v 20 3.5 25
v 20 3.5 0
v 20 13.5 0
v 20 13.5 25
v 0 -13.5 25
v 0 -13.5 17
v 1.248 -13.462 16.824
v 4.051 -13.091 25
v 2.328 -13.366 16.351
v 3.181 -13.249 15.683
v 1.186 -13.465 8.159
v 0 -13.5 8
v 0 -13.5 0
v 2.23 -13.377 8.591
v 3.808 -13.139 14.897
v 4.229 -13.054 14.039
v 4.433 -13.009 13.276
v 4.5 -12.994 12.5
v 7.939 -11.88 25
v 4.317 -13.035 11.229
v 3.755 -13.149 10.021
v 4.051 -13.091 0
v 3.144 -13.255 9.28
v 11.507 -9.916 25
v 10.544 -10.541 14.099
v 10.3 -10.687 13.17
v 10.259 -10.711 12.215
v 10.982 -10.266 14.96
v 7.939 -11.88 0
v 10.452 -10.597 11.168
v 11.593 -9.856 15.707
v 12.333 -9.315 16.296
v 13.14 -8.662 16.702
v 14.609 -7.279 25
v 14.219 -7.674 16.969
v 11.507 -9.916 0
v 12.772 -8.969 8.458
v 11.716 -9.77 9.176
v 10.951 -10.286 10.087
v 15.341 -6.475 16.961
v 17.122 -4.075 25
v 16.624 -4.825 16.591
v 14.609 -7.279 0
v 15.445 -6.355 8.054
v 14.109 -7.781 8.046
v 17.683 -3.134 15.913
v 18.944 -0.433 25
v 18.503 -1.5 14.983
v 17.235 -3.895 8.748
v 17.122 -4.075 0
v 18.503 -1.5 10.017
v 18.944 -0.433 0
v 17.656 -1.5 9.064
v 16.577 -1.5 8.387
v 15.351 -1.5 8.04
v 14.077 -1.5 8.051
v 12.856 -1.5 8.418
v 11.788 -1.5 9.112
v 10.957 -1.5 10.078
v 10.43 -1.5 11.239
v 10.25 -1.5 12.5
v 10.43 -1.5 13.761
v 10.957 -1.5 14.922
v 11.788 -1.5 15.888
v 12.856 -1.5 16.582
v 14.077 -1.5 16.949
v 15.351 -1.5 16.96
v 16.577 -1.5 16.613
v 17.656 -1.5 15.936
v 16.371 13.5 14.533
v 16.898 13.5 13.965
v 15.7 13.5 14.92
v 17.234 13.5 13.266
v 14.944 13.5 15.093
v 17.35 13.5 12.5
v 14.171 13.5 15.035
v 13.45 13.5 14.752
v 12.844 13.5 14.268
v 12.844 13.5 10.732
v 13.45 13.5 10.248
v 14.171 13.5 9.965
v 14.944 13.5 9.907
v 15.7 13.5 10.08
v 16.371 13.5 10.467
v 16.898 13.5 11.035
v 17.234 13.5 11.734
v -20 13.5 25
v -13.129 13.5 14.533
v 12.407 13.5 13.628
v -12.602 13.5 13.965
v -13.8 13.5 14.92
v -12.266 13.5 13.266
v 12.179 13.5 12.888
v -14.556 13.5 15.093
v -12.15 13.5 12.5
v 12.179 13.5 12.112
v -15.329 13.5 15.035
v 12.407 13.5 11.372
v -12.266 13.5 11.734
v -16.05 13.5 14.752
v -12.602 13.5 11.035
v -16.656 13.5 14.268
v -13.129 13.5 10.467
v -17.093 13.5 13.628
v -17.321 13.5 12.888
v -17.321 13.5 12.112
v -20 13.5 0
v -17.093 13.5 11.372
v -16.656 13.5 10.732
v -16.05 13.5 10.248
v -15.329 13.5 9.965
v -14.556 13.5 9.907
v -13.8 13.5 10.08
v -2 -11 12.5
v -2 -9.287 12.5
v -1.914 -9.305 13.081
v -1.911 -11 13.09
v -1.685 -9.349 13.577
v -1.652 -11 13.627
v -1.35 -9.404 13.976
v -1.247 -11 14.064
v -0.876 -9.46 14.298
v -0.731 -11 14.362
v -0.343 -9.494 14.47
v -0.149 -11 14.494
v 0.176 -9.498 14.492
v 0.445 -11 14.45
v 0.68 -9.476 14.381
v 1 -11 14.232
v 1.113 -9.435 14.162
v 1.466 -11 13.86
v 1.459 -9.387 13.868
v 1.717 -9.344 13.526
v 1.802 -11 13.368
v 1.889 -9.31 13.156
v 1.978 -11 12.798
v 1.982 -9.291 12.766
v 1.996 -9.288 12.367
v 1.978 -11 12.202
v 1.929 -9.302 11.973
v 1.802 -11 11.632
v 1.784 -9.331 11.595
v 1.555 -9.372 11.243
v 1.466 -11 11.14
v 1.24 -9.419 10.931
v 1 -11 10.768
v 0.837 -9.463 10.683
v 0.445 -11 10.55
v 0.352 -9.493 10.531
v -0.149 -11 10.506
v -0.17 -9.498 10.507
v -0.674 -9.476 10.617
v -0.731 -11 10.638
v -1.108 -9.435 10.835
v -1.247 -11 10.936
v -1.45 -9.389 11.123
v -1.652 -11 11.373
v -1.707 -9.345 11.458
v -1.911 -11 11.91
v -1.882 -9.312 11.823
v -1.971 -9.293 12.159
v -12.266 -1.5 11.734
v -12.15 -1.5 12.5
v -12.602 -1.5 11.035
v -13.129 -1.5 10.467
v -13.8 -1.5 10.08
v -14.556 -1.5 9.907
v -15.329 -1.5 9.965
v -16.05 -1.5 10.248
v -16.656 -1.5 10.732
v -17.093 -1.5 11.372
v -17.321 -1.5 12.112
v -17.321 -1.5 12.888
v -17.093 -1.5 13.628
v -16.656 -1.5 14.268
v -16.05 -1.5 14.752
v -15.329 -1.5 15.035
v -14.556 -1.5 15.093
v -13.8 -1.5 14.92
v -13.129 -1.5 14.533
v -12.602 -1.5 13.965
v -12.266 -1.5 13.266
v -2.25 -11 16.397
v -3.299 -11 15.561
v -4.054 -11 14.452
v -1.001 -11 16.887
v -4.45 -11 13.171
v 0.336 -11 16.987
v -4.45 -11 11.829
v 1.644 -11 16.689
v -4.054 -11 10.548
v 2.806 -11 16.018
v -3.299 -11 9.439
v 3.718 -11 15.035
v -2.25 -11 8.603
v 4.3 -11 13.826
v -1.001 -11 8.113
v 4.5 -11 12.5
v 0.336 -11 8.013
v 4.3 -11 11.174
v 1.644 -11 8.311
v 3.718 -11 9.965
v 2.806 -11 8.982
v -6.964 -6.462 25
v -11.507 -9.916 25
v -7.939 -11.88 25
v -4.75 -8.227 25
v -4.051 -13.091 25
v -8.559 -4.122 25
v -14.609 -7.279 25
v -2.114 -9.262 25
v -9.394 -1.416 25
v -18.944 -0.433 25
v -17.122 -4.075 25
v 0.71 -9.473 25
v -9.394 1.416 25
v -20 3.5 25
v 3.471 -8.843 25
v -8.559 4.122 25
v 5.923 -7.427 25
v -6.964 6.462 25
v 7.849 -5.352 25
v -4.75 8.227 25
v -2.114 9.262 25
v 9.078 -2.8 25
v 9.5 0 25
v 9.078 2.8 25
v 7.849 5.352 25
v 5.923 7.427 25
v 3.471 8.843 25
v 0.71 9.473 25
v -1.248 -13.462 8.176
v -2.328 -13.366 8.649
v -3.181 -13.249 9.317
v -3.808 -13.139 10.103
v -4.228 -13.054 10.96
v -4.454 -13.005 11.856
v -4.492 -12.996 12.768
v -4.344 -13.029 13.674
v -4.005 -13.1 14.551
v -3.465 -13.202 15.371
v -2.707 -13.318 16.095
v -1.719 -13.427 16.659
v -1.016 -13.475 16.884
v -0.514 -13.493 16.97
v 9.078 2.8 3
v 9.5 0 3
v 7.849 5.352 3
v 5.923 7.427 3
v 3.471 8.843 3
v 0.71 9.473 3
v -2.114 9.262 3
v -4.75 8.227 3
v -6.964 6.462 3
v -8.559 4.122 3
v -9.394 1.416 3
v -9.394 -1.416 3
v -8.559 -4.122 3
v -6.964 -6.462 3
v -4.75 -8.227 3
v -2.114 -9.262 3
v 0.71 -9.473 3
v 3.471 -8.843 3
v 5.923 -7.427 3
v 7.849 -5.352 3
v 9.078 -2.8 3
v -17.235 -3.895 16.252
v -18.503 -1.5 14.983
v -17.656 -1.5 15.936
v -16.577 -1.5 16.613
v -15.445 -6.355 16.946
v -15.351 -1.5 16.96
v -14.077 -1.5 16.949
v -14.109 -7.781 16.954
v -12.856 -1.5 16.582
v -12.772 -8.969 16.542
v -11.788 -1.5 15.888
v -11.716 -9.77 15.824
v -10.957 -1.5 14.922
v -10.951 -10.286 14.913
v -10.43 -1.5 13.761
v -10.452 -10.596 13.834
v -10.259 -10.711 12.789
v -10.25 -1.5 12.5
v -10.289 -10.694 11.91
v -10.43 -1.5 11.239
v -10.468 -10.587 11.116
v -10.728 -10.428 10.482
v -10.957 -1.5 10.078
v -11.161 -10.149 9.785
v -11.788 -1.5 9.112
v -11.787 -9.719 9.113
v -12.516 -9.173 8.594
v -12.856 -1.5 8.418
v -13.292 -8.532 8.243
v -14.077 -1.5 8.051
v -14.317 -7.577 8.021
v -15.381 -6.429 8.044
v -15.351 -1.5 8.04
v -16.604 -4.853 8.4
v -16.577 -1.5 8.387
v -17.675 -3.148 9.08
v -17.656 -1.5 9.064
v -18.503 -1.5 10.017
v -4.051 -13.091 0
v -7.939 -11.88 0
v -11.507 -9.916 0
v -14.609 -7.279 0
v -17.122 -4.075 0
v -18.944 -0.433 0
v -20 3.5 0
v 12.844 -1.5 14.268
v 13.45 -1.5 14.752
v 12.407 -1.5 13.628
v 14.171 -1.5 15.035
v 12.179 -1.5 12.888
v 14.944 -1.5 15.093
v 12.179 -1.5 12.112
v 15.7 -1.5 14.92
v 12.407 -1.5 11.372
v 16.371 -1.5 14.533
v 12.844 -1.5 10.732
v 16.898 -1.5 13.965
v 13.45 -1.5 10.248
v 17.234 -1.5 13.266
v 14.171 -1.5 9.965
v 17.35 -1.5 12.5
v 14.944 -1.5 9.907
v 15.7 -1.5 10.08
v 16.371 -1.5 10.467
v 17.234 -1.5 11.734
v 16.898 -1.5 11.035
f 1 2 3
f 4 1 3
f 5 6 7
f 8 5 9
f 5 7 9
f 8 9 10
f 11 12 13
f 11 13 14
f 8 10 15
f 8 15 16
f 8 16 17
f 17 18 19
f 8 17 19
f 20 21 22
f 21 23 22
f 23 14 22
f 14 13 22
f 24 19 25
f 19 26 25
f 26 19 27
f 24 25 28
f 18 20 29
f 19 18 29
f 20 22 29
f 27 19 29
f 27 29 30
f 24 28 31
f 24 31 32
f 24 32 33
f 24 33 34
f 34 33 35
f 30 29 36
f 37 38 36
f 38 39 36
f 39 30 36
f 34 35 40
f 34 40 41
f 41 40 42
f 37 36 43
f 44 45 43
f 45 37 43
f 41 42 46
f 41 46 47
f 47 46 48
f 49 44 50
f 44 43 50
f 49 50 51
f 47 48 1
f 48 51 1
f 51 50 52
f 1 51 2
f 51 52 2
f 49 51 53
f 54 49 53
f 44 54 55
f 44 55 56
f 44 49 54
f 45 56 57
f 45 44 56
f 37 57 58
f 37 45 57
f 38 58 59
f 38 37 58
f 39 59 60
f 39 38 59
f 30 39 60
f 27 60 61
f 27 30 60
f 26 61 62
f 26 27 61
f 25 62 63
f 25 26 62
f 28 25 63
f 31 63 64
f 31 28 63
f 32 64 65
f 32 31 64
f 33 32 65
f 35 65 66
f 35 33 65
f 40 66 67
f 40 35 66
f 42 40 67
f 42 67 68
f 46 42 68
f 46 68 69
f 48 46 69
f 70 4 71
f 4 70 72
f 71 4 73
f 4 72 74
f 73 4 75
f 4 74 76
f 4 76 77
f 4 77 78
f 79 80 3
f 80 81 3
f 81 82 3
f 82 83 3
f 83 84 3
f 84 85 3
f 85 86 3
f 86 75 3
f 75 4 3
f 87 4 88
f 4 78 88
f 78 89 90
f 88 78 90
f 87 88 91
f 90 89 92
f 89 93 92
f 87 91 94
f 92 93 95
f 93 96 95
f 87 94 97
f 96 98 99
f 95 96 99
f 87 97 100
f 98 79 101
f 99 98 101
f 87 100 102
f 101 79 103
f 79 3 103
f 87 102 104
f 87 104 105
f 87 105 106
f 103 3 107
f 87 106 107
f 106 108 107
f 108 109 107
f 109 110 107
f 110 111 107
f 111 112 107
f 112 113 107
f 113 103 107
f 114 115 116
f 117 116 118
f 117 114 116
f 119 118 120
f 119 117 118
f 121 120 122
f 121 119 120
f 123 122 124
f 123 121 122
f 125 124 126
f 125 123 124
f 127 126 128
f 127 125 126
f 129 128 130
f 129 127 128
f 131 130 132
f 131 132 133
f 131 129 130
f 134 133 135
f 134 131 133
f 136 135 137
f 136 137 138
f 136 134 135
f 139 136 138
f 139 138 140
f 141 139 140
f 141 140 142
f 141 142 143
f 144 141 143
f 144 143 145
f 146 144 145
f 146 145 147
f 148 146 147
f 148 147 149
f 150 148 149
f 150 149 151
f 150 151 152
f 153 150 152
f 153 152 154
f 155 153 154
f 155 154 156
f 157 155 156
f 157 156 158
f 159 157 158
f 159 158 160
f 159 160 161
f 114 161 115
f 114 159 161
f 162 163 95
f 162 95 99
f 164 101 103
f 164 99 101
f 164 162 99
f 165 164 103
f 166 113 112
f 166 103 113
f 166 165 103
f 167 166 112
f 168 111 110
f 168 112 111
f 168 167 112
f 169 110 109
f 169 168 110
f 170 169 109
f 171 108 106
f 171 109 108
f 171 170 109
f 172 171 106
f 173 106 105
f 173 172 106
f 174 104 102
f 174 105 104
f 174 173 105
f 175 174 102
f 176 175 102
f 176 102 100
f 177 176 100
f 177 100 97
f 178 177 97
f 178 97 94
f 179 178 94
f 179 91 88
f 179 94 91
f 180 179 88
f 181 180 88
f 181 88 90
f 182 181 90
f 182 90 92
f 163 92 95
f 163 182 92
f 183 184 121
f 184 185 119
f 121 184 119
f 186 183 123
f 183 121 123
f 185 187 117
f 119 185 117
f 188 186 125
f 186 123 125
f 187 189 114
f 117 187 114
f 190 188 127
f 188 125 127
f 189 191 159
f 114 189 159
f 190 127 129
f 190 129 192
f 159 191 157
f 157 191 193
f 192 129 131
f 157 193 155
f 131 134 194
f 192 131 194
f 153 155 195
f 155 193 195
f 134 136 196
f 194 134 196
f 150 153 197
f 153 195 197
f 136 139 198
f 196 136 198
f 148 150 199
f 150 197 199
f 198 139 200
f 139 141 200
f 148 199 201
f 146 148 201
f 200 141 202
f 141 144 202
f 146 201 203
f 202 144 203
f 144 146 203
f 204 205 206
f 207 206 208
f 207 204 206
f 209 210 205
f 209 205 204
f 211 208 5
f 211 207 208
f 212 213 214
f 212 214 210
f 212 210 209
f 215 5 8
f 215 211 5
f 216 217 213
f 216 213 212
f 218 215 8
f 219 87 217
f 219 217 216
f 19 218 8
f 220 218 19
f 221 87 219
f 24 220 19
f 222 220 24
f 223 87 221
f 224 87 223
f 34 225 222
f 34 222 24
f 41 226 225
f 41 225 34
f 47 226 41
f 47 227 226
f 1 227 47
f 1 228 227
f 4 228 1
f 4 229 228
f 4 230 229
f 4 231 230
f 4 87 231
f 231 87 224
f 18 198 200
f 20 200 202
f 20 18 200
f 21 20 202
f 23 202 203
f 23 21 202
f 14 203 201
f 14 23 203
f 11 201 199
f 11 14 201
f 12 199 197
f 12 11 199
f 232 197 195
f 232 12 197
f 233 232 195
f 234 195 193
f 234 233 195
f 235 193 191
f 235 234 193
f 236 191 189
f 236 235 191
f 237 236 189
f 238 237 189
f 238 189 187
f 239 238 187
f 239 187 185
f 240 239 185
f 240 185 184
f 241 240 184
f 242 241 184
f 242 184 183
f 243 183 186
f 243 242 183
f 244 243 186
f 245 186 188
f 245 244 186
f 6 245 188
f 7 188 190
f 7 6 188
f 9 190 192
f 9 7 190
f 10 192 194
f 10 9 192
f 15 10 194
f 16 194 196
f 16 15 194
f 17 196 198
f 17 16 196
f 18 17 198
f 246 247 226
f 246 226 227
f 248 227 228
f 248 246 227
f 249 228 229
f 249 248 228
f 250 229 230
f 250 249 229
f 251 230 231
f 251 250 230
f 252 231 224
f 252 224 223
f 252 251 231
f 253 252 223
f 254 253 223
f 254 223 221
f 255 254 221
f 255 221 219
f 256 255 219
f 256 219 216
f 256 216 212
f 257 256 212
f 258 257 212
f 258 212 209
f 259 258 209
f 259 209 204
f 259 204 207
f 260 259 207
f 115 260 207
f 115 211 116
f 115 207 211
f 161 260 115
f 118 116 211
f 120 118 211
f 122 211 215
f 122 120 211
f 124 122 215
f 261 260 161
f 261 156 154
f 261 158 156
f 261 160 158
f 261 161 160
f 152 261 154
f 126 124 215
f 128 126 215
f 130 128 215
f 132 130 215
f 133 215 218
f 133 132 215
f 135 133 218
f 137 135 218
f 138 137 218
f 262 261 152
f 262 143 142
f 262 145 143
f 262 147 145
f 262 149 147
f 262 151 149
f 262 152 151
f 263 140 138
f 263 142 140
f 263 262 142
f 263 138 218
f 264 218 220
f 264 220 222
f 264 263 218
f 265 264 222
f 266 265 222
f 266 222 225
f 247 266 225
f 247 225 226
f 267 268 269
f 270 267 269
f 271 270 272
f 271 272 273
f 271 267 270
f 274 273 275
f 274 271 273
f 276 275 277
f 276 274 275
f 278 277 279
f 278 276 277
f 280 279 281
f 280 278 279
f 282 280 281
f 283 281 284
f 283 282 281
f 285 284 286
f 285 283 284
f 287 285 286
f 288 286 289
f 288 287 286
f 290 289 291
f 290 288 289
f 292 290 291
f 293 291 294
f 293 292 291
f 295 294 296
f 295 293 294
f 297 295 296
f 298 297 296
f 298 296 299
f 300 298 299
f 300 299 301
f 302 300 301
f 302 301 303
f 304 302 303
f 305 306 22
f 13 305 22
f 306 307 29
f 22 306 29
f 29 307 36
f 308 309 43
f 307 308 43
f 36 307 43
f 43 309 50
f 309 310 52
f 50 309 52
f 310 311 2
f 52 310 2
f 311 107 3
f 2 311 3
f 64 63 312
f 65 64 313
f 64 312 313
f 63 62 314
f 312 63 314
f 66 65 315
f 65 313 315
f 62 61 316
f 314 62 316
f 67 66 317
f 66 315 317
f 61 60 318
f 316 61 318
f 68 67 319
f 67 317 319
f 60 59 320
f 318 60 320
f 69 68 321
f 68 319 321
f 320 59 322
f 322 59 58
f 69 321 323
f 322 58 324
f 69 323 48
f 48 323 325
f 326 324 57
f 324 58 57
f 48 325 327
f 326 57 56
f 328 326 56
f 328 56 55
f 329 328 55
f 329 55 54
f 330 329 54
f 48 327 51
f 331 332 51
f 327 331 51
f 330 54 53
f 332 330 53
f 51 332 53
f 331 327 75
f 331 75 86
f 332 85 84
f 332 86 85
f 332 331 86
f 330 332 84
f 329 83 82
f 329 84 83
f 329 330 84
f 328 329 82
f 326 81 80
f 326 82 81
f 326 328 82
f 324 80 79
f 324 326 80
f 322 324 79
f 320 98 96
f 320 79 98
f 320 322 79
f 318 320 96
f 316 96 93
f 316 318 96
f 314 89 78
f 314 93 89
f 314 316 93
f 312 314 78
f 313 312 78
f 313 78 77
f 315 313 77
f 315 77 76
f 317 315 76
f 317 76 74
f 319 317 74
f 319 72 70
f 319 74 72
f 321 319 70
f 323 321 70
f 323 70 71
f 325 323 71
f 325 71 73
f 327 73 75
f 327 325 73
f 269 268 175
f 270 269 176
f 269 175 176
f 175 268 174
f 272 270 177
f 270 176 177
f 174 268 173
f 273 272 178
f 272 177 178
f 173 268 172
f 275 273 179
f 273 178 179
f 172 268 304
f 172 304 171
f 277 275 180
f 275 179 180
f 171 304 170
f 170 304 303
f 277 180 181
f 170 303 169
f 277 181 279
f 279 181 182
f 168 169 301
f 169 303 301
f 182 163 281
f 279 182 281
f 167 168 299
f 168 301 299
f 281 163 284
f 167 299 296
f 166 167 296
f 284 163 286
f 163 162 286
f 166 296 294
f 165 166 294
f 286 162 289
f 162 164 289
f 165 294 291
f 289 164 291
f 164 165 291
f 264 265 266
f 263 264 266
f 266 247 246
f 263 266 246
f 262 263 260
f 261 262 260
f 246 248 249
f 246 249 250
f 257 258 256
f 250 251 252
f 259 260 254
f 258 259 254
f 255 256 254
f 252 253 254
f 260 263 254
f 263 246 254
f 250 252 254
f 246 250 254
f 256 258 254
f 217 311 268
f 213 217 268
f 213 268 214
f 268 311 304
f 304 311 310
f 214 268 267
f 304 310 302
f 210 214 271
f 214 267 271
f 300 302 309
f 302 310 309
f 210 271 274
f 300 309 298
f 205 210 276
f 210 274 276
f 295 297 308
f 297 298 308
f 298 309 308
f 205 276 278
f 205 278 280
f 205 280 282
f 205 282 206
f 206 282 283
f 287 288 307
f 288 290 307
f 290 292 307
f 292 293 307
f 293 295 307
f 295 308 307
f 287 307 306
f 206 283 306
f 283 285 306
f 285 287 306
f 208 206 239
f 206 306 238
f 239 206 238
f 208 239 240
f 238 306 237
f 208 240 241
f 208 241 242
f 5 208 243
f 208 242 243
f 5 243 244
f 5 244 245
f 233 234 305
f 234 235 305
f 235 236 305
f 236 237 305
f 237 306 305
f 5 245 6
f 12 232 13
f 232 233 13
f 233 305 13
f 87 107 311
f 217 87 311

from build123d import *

# Parameters (mm, degrees)
CROQUIS1_R                 = 9.5
SALIENTE_EXTRUIR1_DEPTH    = 25
SALIENTE_EXTRUIR2_DEPTH    = 3
CORTAR_EXTRUIR1_DEPTH      = 42.880783183
CORTAR_EXTRUIR1_DEPTH_BACK = 200
CROQUIS3_R                 = 2.6
CROQUIS4_R                 = 4.5
CORTAR_EXTRUIR2_DEPTH      = 10
CORTAR_EXTRUIR3_DEPTH      = 10
CORTAR_EXTRUIR3_DEPTH_BACK = 10
CROQUIS5_R                 = 2
CORTAR_EXTRUIR4_DEPTH      = 0.5
CORTAR_EXTRUIR4_DEPTH_BACK = 10.5
CROQUIS6_R                 = 4.5


with BuildPart() as part:
    # Croquis1 → Saliente-Extruir1 (new body)
    with BuildSketch(Plane.XY):
        with BuildLine():
            Line((0, 13.5), (-20, 13.5))
            Line((-20, 13.5), (-20, 3.5))
            ThreePointArc((-20, 3.5), (-13.124404748, -8.675770292), (0, -13.5))
            ThreePointArc((0, -13.5), (13.124404748, -8.675770292), (20, 3.5))
            Line((20, 3.5), (20, 13.5))
            Line((20, 13.5), (0, 13.5))
        make_face()
        Circle(CROQUIS1_R, mode=Mode.SUBTRACT)
    extrude(amount=SALIENTE_EXTRUIR1_DEPTH)

    # Croquis2 → Saliente-Extruir2 (add)
    with BuildSketch(Plane(origin=(0, 0, 0), x_dir=(-1, 0, 0), z_dir=(0, 0, -1))):
        with BuildLine():
            Line((20, 13.5), (-20, 13.5))
            Line((-20, 13.5), (-20, 3.5))
            ThreePointArc((-20, 3.5), (0, -13.5), (20, 3.5))
            Line((20, 3.5), (20, 13.5))
        make_face()
    extrude(amount=-SALIENTE_EXTRUIR2_DEPTH)

    # Croquis3 → Cortar-Extruir1 (cut, two sides: drawn at the far end of the back side and taken through both)
    with BuildSketch(Plane(origin=(0, 13.5, 0), x_dir=(1, 0, 0), z_dir=(0, 1, 0)).offset(-CORTAR_EXTRUIR1_DEPTH_BACK)):
        with Locations((14.75, -12.5)):
            Circle(CROQUIS3_R)
        with Locations((-14.75, -12.5)):
            Circle(CROQUIS3_R)
    extrude(amount=CORTAR_EXTRUIR1_DEPTH + CORTAR_EXTRUIR1_DEPTH_BACK, mode=Mode.SUBTRACT)

    # Croquis4 → Cortar-Extruir2 (cut)
    with BuildSketch(Plane(origin=(0, -11.5, 0), x_dir=(1, 0, 0), z_dir=(0, 1, 0))):
        with Locations((-14.75, -12.5)):
            Circle(CROQUIS4_R)
        with Locations((14.75, -12.5)):
            Circle(CROQUIS4_R)
    extrude(amount=CORTAR_EXTRUIR2_DEPTH, mode=Mode.SUBTRACT)

    # Croquis5 → Cortar-Extruir3 (cut, two sides: drawn at the far end of the back side and taken through both)
    with BuildSketch(Plane(origin=(0, -11.5, 0), x_dir=(1, 0, 0), z_dir=(0, 1, 0)).offset(-CORTAR_EXTRUIR3_DEPTH_BACK)):
        with Locations((0, -12.5)):
            Circle(CROQUIS5_R)
    extrude(amount=CORTAR_EXTRUIR3_DEPTH + CORTAR_EXTRUIR3_DEPTH_BACK, mode=Mode.SUBTRACT)

    # Croquis6 → Cortar-Extruir4 (cut, two sides: drawn at the far end of the back side and taken through both)
    with BuildSketch(Plane(origin=(0, -11.5, 0), x_dir=(1, 0, 0), z_dir=(0, 1, 0)).offset(-CORTAR_EXTRUIR4_DEPTH_BACK)):
        with Locations((0, -12.5)):
            Circle(CROQUIS6_R)
    extrude(amount=CORTAR_EXTRUIR4_DEPTH + CORTAR_EXTRUIR4_DEPTH_BACK, mode=Mode.SUBTRACT)


solid = part.part
